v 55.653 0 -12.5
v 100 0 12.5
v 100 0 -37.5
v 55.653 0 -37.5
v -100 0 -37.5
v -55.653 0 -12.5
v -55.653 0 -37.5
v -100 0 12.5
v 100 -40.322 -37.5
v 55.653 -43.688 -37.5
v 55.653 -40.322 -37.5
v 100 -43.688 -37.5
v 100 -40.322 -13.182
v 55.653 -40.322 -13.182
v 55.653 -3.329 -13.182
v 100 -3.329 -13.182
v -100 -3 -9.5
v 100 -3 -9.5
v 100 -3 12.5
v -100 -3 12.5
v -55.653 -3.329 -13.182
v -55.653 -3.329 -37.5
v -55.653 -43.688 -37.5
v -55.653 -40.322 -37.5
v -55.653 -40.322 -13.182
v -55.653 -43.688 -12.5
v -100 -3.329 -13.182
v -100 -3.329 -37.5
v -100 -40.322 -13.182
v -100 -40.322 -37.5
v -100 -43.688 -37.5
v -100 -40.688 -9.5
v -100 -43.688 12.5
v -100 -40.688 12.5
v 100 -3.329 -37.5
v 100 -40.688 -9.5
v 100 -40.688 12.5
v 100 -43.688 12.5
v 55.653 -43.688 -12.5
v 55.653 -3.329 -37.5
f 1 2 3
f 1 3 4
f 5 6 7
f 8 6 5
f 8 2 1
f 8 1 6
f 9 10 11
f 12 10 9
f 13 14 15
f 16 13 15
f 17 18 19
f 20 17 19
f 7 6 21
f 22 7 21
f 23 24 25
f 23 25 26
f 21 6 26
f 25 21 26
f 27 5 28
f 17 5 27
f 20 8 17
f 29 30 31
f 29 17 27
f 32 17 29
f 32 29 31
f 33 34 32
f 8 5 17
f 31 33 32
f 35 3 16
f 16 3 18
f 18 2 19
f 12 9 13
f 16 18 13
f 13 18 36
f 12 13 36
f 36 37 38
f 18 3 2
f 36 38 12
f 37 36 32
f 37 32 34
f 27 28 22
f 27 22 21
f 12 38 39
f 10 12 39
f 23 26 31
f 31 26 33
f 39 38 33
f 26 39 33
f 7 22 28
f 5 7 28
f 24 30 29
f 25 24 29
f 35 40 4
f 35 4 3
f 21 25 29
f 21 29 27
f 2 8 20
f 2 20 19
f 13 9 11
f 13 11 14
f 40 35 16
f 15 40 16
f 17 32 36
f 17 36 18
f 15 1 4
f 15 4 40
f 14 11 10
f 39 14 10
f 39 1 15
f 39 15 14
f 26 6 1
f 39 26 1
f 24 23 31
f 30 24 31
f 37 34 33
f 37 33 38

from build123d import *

# Parameters (mm, degrees)
F0_W     = 200
F0_H     = 25
F1_DEPTH = 43.688
F2_W     = 37.688
F2_H     = 22
F3_DEPTH = 200.001
F4_W     = 44.3474374712
F4_H     = 43.688
F5_DEPTH = 25
F7_W     = 36.9936539792
F7_H     = 24.3178982288
F8_DEPTH = 200.001


with BuildPart() as f1:
    # F0 (on Front) → F1 (new body)
    with BuildSketch(Plane.XZ):
        Rectangle(F0_W, F0_H)
    extrude(amount=F1_DEPTH)

    # F2 (on face) → F3 (cut, through all)
    with BuildSketch(Plane.YZ.offset(100)):
        with Locations((-21.844, 1.5)):
            Rectangle(F2_W, F2_H)
    extrude(amount=-F3_DEPTH, mode=Mode.SUBTRACT)

    # F4 (on face) → F5 (join)
    with BuildSketch(Plane(origin=(0, 0, -12.5), x_dir=(1, 0, 0), z_dir=(0, 0, -1))):
        with Locations((77.8262812644, 21.844)):
            Rectangle(F4_W, F4_H)
    extrude(amount=F5_DEPTH)

    # F6: F1 across plane


with BuildPart() as f1_1:
    add(f1.part)
    add(f1.part.mirror(Plane.YZ))

    # F7 (on face) → F8 (cut, through all)
    with BuildSketch(Plane.YZ.offset(100)):
        with Locations((-21.8255401123, -25.3410508856)):
            Rectangle(F7_W, F7_H)
    extrude(amount=-F8_DEPTH, mode=Mode.SUBTRACT)


solid = f1_1.part
